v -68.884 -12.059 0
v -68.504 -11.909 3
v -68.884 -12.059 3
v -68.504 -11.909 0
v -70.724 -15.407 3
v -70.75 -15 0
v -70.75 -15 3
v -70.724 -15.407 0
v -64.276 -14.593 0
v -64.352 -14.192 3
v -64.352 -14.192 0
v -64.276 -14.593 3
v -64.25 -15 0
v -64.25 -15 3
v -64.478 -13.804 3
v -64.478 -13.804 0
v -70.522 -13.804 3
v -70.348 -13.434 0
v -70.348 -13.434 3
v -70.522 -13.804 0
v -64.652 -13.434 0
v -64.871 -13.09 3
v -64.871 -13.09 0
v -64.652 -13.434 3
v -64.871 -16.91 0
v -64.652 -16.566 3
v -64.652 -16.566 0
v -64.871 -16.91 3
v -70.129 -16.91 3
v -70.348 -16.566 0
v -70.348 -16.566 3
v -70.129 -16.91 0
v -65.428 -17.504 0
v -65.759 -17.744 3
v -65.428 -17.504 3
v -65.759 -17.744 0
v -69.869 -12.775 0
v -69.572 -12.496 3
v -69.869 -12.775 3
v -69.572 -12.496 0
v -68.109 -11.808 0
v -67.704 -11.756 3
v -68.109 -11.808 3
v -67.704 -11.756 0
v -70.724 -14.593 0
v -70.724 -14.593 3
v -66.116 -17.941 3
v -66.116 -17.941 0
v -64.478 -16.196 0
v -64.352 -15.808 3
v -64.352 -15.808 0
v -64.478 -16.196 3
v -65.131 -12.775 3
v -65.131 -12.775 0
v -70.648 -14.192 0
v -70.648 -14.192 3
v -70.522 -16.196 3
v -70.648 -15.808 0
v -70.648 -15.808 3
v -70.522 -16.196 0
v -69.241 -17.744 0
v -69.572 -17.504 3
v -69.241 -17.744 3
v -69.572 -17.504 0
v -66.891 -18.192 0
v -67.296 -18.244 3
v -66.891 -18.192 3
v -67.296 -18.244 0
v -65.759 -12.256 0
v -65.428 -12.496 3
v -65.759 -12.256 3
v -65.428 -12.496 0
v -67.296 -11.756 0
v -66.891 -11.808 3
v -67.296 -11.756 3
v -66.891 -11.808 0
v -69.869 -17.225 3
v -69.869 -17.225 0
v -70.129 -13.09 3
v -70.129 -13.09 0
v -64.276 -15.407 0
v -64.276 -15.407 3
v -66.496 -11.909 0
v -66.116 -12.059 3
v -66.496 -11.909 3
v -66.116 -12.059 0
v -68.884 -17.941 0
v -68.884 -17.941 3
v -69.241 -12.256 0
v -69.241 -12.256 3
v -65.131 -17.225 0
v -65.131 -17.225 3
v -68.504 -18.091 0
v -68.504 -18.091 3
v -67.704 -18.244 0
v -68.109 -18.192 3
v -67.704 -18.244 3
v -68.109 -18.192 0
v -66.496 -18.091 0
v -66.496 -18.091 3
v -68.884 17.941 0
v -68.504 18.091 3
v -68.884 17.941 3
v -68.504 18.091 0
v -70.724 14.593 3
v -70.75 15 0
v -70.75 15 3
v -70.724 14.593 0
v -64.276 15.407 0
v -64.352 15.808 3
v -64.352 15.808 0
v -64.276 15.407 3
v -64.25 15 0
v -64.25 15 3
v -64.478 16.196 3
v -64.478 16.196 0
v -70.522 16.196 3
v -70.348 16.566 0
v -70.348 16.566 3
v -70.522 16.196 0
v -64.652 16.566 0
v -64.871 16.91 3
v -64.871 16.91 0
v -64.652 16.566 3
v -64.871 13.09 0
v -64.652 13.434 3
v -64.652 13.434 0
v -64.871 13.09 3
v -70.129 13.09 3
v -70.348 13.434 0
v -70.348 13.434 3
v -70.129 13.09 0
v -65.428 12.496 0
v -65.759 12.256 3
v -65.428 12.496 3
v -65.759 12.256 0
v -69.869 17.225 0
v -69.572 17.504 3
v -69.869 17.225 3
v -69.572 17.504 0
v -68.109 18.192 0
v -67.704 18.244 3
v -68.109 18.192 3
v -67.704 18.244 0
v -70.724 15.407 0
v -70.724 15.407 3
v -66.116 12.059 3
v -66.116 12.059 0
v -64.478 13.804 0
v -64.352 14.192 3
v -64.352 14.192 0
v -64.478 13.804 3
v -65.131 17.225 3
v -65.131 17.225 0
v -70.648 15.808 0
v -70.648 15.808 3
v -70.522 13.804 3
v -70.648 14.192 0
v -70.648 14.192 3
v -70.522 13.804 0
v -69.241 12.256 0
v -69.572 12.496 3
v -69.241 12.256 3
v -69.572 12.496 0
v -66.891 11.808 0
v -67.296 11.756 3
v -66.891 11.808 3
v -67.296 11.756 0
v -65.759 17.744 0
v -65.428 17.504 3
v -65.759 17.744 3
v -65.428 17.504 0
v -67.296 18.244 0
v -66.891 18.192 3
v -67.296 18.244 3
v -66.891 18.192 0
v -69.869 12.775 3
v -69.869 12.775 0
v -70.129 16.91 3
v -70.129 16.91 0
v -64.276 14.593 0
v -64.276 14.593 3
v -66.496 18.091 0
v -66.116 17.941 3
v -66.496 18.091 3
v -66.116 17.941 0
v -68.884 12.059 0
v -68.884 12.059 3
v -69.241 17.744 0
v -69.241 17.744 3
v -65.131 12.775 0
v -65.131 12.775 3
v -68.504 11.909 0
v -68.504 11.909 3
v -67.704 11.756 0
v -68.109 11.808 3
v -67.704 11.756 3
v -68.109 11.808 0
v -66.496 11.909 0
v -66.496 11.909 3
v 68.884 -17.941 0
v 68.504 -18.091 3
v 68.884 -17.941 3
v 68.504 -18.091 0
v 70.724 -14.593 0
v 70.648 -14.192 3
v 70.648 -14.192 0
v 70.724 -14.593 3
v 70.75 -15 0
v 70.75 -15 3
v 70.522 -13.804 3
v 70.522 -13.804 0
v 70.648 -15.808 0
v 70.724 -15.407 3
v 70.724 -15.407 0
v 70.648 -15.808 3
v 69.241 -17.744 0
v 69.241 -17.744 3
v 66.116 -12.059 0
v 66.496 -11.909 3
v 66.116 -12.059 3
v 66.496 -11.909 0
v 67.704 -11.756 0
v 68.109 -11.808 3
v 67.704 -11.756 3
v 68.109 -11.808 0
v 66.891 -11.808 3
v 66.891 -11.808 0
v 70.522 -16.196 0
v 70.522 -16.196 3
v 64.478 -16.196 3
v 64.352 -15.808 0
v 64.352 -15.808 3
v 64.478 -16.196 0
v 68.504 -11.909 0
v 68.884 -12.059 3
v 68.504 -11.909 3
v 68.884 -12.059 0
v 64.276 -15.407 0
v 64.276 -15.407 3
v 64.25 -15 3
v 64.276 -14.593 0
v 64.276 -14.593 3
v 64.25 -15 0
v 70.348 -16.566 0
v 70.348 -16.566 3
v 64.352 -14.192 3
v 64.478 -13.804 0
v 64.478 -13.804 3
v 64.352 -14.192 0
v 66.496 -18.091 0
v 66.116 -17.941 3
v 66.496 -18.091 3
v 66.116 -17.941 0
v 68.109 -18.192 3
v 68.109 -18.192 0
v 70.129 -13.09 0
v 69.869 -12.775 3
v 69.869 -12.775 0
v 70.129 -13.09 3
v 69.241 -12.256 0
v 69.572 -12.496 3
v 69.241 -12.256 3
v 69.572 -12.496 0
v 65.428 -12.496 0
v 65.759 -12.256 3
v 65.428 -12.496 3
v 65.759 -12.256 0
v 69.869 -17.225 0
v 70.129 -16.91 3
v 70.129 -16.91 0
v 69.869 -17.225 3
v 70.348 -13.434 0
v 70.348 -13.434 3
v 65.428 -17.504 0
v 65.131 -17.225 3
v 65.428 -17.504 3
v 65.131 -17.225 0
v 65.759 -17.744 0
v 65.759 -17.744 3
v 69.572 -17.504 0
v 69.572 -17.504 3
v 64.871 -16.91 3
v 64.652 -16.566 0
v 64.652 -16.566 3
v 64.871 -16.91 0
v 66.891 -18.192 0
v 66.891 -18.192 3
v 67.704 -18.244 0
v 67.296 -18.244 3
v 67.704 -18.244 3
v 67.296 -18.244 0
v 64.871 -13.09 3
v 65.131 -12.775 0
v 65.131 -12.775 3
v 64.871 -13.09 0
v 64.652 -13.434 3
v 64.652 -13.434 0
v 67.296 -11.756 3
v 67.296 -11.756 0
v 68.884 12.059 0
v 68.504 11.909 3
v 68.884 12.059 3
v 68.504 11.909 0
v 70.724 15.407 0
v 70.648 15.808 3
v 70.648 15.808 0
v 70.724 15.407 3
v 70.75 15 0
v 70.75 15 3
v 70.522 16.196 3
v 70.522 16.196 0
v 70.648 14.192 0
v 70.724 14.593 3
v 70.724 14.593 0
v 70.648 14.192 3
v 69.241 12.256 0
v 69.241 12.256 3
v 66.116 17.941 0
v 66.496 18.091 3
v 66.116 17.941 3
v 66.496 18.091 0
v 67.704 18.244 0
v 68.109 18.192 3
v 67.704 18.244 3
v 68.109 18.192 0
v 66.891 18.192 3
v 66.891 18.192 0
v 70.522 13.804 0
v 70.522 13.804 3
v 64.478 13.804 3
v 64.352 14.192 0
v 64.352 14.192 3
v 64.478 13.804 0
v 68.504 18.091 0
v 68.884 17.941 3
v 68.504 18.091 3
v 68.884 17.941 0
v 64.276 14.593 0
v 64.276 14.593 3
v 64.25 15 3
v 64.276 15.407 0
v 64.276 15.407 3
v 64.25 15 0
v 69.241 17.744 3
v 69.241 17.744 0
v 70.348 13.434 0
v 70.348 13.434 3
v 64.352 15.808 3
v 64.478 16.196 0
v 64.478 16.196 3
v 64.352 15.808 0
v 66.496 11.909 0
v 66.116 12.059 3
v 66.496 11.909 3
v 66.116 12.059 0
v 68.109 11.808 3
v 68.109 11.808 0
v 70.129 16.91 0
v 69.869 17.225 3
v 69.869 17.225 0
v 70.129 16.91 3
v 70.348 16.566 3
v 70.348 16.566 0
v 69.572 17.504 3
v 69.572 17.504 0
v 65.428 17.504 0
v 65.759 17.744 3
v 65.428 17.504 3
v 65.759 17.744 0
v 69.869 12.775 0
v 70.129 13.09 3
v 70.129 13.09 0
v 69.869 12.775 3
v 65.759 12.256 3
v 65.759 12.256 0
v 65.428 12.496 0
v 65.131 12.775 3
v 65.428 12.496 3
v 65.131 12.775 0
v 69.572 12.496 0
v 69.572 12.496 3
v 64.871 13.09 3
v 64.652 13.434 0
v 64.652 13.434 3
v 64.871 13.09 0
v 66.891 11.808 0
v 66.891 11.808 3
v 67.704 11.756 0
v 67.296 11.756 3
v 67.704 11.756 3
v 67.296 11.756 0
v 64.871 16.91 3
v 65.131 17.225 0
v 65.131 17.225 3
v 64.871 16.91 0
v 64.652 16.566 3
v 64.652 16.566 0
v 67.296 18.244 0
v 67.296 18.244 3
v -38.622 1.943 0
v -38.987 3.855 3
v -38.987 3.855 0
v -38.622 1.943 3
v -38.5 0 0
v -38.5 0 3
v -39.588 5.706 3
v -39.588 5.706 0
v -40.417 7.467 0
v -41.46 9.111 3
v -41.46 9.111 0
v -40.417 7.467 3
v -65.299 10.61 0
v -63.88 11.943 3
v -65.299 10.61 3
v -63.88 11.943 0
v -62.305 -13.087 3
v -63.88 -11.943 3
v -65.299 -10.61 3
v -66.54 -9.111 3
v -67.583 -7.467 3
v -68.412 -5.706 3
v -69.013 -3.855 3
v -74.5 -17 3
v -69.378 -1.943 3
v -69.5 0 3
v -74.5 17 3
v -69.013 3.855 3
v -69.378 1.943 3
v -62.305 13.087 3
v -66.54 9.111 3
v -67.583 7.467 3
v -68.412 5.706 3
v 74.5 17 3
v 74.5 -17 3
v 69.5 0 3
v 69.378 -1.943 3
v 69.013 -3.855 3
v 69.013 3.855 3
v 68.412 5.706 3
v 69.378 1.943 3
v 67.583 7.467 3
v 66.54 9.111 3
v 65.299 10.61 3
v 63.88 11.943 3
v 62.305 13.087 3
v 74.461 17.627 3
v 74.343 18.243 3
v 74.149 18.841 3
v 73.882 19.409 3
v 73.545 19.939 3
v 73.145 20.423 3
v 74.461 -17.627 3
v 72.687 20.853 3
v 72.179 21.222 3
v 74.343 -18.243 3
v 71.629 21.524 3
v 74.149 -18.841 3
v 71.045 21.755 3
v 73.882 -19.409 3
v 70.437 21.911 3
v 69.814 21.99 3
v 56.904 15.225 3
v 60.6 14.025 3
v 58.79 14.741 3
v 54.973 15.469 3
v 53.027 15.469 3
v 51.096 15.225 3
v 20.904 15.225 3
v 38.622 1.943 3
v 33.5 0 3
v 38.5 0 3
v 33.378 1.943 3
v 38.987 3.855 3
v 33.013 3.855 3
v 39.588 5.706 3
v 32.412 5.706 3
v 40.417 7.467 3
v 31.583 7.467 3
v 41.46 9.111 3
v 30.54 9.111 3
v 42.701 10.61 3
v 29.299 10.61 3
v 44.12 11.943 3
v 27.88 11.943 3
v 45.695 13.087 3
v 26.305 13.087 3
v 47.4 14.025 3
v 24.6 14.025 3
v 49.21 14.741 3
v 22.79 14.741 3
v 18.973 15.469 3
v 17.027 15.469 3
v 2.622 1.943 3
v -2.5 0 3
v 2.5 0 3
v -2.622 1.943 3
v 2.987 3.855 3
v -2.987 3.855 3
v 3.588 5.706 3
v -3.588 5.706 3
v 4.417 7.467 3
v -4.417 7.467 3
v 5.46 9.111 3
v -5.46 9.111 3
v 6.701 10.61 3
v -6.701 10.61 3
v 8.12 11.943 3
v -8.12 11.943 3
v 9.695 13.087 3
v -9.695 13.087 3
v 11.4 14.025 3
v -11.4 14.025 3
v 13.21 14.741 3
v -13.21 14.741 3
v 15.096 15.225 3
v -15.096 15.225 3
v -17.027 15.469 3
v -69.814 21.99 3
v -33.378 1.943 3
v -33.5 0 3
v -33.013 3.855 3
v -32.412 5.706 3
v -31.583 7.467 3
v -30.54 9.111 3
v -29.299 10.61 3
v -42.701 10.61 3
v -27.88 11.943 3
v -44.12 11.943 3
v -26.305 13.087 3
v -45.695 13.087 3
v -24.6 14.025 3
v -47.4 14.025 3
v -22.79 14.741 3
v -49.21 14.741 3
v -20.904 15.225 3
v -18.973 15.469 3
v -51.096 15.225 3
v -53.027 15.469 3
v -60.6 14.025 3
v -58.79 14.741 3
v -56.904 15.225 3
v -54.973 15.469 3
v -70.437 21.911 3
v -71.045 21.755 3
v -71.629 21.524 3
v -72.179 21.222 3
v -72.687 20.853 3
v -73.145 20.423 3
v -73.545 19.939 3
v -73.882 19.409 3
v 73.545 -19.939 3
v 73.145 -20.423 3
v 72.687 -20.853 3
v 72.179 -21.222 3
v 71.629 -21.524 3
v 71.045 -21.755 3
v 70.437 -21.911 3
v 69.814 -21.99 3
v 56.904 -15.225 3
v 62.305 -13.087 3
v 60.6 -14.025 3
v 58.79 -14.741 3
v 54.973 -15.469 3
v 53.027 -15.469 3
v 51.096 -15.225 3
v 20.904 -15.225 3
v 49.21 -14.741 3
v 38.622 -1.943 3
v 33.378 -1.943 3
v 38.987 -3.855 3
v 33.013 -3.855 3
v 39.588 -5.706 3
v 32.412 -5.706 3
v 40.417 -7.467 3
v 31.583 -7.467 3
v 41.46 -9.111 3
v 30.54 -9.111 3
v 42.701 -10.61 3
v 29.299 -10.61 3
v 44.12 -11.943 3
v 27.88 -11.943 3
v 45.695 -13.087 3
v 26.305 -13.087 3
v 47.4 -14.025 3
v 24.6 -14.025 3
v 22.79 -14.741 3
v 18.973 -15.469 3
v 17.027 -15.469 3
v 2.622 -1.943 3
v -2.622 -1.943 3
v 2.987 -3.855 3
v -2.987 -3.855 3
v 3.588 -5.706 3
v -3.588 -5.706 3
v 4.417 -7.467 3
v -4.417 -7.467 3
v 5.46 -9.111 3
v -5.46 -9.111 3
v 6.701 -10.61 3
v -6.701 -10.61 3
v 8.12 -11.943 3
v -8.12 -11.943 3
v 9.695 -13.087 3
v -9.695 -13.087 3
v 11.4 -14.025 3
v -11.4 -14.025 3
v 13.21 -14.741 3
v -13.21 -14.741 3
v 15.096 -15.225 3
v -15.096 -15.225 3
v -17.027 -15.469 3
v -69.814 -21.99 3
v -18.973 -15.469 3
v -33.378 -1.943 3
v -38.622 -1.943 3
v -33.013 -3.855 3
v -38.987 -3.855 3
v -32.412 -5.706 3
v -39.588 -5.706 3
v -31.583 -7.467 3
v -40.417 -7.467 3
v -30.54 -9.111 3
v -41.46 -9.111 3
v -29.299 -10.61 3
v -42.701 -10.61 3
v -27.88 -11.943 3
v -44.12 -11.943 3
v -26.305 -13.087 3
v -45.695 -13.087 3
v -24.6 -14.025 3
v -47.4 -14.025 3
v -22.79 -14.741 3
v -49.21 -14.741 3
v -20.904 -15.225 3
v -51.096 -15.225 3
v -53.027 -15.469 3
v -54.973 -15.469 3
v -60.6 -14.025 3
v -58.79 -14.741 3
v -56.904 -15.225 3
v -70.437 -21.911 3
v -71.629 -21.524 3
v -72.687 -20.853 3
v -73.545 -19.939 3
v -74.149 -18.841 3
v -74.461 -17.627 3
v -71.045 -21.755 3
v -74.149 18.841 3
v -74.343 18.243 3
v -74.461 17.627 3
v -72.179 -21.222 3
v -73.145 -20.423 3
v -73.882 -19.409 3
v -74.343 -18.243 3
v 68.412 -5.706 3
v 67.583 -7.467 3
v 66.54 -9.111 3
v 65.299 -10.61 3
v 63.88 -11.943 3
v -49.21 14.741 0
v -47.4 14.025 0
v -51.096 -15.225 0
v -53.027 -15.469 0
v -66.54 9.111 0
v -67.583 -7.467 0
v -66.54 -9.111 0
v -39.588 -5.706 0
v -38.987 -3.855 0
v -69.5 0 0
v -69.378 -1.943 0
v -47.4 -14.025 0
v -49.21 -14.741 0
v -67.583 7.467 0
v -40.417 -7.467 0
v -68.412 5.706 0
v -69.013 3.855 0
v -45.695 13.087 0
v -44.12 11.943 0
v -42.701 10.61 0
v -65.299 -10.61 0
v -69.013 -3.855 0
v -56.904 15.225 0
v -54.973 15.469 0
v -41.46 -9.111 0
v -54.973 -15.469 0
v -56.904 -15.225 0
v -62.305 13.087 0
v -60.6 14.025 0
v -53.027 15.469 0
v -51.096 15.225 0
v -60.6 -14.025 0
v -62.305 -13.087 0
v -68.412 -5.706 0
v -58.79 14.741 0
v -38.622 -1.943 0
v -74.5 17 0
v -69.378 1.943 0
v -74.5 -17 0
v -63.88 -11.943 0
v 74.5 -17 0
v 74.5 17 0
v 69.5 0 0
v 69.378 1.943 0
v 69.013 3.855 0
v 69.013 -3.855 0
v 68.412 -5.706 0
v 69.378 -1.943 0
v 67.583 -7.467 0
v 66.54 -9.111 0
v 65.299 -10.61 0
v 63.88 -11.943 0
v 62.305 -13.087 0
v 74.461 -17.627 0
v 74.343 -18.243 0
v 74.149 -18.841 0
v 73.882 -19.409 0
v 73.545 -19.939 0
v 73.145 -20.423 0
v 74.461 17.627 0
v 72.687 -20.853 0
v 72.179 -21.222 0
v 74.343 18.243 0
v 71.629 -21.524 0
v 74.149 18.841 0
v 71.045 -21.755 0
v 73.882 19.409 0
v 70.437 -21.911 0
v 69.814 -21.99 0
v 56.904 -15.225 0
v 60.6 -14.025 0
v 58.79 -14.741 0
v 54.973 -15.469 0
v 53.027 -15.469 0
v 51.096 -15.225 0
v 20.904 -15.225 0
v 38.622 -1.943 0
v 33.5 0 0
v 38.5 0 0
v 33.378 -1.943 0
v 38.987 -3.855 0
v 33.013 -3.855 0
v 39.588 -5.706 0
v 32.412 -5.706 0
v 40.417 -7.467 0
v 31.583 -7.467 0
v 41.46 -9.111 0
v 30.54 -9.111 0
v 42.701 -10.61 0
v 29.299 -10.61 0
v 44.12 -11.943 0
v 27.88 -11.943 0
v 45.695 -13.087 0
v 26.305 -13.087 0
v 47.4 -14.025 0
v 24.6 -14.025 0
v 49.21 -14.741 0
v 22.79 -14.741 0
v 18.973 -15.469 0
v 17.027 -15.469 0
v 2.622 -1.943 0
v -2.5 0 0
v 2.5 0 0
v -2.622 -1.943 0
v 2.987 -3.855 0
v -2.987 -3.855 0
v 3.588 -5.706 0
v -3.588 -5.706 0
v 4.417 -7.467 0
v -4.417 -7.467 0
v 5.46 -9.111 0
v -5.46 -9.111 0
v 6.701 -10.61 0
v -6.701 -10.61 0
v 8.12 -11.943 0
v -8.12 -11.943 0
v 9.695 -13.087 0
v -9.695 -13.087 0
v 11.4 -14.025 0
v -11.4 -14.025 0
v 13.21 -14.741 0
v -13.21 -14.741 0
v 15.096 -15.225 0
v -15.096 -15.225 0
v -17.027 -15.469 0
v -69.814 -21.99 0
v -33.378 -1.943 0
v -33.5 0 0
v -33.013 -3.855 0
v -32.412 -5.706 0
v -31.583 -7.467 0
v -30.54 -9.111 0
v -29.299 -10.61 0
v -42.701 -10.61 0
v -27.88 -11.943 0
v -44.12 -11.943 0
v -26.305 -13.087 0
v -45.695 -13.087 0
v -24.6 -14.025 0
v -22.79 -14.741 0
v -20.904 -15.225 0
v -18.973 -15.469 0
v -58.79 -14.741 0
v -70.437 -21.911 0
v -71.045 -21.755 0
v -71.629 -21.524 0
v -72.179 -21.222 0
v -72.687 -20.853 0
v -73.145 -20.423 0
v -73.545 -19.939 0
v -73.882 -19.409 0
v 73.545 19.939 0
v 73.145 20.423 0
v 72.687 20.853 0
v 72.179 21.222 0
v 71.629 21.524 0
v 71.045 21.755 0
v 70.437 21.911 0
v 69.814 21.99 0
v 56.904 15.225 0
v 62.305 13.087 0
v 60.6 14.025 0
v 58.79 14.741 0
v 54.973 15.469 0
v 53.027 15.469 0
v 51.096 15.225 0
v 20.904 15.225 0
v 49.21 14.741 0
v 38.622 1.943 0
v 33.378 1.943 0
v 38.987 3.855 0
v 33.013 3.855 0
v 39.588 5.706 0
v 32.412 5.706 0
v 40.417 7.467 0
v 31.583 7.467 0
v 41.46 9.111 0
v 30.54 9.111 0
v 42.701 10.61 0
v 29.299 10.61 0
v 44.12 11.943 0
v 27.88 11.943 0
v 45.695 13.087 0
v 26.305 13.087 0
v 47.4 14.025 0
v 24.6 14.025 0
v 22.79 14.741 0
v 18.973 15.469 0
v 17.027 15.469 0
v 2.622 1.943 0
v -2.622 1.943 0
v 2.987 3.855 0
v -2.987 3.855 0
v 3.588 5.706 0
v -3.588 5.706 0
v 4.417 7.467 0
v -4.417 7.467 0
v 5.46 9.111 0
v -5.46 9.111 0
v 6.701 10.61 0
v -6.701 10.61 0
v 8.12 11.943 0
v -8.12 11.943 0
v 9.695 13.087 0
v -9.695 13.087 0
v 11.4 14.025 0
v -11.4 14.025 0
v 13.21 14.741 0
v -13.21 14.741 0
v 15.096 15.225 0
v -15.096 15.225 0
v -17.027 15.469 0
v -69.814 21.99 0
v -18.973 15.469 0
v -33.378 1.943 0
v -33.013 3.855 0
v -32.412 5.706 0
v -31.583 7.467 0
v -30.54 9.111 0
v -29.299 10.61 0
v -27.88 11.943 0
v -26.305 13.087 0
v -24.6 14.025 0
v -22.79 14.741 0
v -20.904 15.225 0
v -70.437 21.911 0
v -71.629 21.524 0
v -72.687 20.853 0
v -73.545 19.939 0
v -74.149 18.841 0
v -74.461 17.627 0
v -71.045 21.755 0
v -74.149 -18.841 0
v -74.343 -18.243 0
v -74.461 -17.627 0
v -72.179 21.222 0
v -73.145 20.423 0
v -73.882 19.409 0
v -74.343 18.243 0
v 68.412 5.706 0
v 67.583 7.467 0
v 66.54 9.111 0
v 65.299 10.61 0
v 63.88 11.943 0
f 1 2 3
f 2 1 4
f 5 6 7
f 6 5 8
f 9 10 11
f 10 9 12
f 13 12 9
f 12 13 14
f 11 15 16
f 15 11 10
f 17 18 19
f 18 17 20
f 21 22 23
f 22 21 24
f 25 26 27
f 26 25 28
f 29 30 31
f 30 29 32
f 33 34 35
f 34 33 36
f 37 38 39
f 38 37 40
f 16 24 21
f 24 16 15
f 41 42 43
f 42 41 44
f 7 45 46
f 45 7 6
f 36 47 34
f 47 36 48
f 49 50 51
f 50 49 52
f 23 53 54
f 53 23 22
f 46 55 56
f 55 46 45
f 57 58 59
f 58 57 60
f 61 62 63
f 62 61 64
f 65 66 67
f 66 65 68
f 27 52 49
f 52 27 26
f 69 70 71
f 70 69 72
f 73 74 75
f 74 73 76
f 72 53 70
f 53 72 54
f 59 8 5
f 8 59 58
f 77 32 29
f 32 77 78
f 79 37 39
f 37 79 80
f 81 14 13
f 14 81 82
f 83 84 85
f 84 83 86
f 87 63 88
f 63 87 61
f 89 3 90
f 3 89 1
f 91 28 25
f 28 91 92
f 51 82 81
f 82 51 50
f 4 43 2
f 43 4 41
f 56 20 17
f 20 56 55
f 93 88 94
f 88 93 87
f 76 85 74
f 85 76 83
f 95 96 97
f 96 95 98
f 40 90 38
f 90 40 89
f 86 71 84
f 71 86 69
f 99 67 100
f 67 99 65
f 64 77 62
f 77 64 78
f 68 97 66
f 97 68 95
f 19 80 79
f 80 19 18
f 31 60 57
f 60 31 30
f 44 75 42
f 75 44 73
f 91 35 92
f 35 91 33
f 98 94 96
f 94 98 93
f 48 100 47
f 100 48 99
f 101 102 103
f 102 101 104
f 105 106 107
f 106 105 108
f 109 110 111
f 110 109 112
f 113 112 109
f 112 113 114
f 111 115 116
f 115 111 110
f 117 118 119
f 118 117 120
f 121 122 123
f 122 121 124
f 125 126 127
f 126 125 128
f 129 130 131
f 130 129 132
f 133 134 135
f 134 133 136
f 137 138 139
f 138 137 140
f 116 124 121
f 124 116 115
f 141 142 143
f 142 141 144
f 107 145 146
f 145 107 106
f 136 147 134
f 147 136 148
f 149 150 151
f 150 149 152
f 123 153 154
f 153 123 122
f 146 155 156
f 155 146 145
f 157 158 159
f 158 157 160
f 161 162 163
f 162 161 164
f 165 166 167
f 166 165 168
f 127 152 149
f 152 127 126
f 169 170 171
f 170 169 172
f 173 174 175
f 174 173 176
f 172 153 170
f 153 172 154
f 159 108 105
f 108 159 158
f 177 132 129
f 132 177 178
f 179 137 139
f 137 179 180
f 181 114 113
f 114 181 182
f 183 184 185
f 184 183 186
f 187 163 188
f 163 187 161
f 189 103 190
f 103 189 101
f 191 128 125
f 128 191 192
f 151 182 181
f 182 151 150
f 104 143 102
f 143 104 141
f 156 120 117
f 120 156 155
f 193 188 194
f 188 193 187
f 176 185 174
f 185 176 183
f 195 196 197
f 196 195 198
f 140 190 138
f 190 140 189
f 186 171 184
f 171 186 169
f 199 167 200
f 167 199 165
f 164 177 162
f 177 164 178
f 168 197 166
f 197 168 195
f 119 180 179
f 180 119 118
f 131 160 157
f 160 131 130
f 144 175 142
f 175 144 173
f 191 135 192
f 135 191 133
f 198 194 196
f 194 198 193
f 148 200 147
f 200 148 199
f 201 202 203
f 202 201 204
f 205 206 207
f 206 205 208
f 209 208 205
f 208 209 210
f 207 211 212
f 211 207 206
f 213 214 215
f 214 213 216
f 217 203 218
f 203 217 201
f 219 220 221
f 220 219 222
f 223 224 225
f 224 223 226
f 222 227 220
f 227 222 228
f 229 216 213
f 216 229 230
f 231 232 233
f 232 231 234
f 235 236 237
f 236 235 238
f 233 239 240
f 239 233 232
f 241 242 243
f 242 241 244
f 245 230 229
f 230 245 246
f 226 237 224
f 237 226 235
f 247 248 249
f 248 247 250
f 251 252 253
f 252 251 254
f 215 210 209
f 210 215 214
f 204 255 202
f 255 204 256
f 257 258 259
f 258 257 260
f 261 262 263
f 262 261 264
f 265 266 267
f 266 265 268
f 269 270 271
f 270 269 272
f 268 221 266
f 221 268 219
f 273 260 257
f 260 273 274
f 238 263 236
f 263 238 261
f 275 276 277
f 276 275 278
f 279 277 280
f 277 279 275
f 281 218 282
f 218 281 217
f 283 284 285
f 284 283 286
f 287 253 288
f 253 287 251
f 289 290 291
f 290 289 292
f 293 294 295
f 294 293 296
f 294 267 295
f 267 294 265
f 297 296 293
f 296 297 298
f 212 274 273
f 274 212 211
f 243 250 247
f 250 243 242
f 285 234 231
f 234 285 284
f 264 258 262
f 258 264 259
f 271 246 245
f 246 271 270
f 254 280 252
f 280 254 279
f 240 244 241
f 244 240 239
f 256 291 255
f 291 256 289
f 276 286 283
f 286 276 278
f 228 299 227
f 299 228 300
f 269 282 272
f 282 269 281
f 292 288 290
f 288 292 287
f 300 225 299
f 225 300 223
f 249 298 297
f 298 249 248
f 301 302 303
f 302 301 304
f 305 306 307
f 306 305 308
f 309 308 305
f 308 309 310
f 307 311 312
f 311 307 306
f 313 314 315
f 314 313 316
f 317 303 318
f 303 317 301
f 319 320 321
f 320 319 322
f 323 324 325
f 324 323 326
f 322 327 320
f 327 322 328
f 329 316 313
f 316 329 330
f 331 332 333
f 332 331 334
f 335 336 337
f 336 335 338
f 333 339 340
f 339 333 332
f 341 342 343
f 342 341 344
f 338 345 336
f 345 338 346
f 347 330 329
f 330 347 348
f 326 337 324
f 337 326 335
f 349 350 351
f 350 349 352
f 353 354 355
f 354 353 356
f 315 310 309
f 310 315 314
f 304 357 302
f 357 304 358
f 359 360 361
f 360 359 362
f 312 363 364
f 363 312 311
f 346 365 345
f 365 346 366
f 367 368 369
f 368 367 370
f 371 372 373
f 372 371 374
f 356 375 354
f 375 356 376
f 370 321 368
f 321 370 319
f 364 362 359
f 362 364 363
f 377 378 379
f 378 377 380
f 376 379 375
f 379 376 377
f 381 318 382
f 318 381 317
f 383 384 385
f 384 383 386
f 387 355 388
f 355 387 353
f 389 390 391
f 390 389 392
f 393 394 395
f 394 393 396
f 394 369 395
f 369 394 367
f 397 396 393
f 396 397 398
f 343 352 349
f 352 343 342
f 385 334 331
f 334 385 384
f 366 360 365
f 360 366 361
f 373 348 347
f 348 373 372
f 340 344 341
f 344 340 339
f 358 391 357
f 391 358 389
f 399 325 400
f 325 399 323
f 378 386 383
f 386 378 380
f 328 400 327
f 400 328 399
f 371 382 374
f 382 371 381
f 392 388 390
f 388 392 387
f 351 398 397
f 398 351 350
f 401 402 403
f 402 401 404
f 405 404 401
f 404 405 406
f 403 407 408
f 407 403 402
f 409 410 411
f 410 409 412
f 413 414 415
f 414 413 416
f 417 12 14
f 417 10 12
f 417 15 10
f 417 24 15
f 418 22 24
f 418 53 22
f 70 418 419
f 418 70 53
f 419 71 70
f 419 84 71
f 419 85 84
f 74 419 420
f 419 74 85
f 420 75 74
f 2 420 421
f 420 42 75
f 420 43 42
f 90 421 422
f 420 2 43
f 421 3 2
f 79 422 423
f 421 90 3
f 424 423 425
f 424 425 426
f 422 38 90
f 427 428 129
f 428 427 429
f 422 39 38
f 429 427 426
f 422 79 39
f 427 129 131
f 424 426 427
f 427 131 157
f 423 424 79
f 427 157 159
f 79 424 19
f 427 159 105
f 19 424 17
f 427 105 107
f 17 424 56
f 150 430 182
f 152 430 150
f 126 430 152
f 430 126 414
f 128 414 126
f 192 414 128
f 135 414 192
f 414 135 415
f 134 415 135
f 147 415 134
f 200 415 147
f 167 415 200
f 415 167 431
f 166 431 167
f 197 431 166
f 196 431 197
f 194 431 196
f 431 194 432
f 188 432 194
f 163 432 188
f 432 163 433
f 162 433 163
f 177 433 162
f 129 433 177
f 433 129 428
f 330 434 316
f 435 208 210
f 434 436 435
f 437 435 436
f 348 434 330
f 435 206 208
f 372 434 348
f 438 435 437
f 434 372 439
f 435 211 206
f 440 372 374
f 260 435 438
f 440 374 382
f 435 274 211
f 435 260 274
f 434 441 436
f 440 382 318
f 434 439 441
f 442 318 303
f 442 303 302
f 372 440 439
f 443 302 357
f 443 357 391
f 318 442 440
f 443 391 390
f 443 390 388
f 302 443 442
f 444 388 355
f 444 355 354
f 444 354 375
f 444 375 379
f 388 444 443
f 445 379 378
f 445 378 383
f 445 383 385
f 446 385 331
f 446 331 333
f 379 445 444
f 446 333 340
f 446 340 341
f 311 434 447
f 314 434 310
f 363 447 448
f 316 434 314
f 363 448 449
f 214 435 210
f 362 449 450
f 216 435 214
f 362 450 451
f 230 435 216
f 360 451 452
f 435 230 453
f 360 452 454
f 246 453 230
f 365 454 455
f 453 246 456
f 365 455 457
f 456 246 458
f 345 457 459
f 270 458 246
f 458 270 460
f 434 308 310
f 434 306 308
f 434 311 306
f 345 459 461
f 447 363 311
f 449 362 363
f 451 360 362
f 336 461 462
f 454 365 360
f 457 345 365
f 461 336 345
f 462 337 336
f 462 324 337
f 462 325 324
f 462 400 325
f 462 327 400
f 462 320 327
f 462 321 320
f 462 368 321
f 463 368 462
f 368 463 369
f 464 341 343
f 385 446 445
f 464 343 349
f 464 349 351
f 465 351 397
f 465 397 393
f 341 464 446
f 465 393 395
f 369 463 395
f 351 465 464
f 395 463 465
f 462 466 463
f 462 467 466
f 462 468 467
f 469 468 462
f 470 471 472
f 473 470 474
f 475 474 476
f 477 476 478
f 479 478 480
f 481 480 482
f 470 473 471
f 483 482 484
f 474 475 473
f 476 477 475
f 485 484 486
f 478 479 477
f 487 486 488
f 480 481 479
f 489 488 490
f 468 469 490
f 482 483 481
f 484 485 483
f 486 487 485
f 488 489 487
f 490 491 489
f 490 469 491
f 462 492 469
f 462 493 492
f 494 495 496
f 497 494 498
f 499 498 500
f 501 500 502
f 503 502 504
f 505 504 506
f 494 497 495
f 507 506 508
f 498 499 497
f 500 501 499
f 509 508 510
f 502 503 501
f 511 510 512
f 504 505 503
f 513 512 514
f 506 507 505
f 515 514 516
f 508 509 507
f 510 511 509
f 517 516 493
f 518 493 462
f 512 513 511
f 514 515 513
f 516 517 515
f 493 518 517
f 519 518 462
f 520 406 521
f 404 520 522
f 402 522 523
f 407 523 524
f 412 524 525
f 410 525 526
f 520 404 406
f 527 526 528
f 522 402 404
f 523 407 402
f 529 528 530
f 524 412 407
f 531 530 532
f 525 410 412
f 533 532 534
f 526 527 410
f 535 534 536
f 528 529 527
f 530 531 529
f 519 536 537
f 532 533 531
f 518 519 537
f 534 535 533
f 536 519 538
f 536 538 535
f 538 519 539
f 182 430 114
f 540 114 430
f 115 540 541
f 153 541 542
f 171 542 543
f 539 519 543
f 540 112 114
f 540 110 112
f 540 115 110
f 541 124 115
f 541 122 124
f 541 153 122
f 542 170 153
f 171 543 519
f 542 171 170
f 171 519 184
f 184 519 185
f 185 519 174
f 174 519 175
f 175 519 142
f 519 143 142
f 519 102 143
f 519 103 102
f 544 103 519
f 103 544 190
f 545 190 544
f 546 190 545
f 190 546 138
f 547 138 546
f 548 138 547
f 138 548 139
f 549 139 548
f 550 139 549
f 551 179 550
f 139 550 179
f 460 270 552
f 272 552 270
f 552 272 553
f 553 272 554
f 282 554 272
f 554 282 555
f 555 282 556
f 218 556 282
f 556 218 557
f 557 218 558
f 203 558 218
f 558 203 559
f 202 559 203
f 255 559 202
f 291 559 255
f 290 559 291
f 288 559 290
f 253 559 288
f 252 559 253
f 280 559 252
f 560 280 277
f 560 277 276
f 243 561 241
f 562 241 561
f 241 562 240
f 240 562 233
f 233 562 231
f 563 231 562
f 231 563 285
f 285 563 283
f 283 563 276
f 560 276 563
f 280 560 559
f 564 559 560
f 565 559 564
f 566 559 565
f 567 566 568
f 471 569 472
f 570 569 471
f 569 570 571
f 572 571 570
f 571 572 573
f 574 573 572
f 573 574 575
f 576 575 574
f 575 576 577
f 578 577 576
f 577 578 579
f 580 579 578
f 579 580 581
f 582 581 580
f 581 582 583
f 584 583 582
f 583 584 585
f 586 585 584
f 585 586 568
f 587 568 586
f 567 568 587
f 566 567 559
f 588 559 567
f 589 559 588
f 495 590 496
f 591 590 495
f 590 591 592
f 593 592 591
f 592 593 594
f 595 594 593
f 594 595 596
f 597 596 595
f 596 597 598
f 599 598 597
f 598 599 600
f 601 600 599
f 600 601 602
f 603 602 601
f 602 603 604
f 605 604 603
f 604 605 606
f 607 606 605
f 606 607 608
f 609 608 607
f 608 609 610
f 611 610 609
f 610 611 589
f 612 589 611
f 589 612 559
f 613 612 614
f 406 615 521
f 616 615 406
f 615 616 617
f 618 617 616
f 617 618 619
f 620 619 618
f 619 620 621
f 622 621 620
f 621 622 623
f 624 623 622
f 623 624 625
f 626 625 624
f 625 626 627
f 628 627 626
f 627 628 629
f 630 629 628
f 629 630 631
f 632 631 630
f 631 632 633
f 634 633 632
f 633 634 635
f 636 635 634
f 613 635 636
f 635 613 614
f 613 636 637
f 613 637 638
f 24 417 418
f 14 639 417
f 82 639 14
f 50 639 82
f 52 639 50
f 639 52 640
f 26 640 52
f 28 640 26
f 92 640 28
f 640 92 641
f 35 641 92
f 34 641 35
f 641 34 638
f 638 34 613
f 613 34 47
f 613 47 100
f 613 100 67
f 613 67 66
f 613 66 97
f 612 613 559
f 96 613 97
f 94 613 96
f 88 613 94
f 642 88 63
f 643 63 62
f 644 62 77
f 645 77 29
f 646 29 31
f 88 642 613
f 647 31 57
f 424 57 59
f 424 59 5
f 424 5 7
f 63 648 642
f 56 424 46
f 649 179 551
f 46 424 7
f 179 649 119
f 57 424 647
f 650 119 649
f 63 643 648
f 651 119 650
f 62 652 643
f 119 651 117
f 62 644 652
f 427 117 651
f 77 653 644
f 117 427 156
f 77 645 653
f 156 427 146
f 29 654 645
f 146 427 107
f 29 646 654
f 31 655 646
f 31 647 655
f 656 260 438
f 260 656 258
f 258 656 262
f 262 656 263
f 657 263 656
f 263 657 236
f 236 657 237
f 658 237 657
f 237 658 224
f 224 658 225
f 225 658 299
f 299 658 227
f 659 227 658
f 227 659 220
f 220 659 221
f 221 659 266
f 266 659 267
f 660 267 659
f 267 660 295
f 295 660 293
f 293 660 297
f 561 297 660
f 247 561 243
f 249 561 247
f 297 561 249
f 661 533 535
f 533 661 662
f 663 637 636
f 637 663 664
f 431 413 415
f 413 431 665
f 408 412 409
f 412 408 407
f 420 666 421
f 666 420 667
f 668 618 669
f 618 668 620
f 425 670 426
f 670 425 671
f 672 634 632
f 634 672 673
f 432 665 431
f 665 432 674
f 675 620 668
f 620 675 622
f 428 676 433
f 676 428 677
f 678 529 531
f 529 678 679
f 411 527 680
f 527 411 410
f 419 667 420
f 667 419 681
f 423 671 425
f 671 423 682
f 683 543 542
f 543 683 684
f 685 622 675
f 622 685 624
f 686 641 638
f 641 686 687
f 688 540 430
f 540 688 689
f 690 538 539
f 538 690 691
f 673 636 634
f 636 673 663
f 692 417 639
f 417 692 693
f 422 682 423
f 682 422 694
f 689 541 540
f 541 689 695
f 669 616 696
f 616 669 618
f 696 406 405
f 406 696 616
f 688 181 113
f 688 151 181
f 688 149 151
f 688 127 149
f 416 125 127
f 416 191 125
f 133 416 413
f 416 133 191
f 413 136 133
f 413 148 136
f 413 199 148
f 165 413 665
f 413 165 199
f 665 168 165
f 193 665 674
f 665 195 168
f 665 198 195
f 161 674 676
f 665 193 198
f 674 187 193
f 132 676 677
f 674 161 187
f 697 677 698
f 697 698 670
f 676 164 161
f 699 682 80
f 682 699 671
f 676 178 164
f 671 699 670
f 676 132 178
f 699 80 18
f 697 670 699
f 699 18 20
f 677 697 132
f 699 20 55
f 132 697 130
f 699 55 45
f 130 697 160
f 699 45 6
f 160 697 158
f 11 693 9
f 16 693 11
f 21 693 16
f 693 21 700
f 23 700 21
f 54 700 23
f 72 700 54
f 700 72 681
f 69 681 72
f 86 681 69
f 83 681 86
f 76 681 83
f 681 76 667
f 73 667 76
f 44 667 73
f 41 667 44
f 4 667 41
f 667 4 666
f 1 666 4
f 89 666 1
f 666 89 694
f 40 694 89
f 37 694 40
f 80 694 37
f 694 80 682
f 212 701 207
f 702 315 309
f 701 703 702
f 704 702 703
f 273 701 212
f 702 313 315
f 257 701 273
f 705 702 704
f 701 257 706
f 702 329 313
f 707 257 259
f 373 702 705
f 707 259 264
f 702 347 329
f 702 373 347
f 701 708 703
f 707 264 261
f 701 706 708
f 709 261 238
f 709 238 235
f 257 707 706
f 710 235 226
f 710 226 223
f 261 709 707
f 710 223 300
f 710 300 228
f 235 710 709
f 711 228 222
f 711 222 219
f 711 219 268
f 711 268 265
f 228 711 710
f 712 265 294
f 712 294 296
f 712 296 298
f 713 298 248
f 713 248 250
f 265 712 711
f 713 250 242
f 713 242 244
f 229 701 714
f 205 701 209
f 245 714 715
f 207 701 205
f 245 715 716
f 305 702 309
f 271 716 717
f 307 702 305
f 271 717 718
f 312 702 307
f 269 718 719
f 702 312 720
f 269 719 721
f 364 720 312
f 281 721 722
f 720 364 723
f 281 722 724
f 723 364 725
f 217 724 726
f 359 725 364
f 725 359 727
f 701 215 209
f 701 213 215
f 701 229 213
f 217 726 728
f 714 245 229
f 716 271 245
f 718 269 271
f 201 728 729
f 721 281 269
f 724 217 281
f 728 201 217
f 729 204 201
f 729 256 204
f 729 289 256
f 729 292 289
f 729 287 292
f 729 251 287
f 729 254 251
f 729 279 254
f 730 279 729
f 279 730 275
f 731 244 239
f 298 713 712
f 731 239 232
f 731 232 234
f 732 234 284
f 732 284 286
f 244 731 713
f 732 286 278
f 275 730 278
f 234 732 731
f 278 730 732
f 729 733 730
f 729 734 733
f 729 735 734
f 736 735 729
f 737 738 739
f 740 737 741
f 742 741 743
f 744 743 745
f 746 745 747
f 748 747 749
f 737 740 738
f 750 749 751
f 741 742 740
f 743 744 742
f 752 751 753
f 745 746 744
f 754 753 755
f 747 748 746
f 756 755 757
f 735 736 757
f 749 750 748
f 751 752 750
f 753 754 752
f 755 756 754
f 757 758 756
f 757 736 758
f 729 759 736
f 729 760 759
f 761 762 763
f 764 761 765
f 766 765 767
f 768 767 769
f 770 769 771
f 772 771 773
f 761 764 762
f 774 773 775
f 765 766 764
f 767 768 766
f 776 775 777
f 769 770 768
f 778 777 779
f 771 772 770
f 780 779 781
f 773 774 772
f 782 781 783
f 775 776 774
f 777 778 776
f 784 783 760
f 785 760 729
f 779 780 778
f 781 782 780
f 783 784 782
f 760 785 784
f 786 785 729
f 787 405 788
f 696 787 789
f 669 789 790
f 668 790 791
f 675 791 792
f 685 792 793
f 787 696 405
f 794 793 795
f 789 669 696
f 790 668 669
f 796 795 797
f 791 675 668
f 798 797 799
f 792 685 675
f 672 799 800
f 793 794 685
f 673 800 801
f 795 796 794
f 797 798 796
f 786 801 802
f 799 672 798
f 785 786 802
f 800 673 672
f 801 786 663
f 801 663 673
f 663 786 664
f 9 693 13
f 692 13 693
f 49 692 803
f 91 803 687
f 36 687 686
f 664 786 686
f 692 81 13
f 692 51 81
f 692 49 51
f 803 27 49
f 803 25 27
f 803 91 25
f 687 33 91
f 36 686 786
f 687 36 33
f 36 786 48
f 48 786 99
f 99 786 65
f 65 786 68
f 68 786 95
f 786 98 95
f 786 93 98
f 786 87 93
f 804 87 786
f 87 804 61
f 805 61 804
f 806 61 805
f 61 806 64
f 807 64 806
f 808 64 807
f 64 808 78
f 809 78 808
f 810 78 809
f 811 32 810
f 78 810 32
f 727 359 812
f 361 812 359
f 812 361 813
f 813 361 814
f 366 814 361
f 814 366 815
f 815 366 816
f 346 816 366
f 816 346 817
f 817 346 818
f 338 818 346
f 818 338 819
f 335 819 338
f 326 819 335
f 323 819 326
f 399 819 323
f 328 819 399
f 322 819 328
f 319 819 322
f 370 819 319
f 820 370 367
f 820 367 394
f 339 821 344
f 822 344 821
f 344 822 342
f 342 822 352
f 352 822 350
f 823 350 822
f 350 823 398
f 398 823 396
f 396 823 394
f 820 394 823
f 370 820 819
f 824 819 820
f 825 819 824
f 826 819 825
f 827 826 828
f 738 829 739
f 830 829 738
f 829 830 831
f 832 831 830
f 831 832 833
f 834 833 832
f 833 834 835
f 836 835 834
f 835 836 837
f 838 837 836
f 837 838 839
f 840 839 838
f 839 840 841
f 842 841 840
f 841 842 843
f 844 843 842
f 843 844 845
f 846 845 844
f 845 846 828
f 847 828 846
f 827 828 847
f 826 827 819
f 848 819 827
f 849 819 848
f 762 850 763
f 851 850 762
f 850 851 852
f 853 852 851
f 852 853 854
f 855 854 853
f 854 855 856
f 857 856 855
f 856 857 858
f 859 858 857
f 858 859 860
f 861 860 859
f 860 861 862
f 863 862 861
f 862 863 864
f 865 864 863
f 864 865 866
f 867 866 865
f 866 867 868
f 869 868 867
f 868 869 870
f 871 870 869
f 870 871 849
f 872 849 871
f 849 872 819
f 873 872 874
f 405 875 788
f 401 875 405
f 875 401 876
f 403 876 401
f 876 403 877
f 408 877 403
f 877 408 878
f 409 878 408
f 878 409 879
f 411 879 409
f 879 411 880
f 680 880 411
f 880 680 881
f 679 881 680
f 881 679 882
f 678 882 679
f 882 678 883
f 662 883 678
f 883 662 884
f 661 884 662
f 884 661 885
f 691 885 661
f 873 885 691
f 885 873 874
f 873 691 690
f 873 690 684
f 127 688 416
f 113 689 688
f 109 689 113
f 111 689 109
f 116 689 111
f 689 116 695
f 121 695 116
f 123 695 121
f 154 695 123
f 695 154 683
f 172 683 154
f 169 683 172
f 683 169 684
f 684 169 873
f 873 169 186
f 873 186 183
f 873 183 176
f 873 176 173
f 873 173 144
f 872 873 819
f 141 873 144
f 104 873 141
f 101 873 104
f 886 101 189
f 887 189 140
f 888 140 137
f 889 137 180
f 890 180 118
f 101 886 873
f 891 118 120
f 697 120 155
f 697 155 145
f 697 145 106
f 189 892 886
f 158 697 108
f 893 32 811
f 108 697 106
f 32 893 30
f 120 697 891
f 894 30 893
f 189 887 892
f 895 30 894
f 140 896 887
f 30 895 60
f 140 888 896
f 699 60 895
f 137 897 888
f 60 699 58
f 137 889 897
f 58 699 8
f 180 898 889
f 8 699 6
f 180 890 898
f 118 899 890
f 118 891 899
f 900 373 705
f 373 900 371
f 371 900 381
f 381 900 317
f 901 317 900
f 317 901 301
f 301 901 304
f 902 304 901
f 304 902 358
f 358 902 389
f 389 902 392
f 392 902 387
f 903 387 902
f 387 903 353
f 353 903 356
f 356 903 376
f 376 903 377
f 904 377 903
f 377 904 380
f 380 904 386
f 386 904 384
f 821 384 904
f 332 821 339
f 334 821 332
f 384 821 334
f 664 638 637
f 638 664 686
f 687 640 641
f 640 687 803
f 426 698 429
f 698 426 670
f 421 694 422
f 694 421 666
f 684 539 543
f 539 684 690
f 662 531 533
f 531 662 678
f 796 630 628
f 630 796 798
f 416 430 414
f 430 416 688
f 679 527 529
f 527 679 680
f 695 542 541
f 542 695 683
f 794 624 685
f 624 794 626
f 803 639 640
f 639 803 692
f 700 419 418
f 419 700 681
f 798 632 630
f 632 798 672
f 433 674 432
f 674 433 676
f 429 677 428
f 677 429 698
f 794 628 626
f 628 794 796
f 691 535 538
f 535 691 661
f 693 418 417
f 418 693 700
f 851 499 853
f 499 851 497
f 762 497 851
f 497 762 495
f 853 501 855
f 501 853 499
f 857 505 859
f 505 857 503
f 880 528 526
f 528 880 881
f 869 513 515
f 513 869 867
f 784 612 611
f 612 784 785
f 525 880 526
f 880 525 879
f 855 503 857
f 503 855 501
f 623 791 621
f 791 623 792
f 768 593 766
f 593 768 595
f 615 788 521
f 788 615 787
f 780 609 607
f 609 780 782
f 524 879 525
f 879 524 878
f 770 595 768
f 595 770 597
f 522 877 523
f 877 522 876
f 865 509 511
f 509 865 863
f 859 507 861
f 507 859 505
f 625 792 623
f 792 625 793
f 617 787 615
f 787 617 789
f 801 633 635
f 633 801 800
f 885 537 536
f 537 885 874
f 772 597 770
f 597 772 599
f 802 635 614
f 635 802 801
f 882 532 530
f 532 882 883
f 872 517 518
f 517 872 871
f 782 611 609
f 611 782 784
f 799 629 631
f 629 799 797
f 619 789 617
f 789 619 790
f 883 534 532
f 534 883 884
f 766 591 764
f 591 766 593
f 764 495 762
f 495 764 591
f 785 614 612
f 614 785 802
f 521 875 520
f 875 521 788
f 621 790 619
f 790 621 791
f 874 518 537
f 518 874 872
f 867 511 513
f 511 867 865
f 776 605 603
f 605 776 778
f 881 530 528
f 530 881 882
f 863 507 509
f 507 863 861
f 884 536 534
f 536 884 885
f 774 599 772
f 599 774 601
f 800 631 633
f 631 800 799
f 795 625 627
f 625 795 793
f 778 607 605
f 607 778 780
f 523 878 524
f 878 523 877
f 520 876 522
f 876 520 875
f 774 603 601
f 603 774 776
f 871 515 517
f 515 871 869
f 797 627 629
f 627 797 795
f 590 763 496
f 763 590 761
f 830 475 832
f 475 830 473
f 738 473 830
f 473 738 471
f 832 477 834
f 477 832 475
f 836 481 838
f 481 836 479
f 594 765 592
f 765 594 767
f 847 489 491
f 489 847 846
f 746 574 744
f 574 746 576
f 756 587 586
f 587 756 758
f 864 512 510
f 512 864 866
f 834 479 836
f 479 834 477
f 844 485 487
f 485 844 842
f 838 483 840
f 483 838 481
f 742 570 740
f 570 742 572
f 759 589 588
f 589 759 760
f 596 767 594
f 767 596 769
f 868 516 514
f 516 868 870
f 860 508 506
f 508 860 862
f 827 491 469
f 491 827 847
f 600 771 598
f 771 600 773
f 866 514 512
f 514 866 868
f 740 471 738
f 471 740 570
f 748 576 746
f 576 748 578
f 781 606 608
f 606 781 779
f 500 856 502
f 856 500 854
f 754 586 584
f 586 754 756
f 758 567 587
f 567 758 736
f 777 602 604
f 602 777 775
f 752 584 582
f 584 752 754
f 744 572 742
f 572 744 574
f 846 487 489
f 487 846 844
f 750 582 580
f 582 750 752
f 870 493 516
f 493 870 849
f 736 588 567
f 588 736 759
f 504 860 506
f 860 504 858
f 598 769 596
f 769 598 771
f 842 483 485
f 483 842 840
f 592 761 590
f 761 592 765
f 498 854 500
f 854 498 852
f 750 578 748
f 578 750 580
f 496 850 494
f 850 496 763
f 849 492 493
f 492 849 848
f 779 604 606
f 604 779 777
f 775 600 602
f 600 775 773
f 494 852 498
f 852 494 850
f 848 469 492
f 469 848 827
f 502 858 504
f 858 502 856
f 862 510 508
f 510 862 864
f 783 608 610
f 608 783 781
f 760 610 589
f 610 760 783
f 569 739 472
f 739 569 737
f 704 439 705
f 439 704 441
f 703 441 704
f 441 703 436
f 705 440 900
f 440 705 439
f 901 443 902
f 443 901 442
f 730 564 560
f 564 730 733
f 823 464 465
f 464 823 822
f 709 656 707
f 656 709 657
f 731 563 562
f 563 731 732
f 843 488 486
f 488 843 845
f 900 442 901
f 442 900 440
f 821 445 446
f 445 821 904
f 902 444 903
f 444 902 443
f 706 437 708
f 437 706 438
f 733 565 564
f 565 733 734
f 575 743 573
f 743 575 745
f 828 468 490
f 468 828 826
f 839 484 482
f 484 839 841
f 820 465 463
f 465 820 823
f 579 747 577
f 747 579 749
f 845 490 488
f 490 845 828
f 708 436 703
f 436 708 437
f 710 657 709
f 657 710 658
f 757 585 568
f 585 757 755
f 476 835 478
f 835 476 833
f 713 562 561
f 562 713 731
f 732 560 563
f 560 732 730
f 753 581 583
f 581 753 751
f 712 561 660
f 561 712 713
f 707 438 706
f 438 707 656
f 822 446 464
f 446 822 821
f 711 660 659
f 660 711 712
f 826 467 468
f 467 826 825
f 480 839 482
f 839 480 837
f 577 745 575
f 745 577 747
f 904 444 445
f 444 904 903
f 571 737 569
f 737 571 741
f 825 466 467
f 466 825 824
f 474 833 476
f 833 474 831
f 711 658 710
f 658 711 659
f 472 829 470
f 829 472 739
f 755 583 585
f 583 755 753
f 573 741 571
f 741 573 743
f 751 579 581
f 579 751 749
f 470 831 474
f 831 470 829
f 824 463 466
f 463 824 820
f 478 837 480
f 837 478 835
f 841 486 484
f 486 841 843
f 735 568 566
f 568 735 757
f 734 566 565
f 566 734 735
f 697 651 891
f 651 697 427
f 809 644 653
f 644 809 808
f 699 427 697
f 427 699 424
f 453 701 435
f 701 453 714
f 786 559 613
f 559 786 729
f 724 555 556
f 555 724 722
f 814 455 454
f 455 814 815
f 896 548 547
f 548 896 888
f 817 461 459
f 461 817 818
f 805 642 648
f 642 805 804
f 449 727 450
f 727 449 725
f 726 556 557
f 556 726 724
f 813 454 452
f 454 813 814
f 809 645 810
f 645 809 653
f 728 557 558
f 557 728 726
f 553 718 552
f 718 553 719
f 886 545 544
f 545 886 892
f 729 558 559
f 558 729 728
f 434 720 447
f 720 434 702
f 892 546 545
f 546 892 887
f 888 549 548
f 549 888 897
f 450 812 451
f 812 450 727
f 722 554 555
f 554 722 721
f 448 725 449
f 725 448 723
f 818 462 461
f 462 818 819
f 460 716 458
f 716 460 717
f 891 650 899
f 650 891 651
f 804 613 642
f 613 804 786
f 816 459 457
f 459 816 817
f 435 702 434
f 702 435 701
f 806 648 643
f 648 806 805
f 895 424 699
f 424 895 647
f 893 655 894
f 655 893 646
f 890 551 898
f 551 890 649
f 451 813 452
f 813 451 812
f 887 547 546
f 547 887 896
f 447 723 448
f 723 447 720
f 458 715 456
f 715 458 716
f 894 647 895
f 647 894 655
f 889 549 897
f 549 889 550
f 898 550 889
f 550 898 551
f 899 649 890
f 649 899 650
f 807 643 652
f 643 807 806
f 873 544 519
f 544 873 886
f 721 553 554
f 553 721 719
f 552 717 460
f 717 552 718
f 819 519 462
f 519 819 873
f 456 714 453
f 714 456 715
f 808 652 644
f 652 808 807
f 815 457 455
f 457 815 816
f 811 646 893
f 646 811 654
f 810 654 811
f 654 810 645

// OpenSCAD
$fn = 50;

difference() {
	union() {
		hull() {
			translate(v = [-69.5, 17.0, 0]) {
				cylinder(h = 3, r = 5);
			}
			translate(v = [69.5, 17.0, 0]) {
				cylinder(h = 3, r = 5);
			}
			translate(v = [-69.5, -17.0, 0]) {
				cylinder(h = 3, r = 5);
			}
			translate(v = [69.5, -17.0, 0]) {
				cylinder(h = 3, r = 5);
			}
		}
	}
	union() {
		translate(v = [-67.5, -15.0, -100.0]) {
			cylinder(h = 200, r = 3.25);
		}
		translate(v = [-67.5, 15.0, -100.0]) {
			cylinder(h = 200, r = 3.25);
		}
		translate(v = [67.5, -15.0, -100.0]) {
			cylinder(h = 200, r = 3.25);
		}
		translate(v = [67.5, 15.0, -100.0]) {
			cylinder(h = 200, r = 3.25);
		}
		translate(v = [-67.5, -15.0, -100.0]) {
			cylinder(h = 200, r = 1.8);
		}
		translate(v = [-67.5, 15.0, -100.0]) {
			cylinder(h = 200, r = 1.8);
		}
		translate(v = [67.5, -15.0, -100.0]) {
			cylinder(h = 200, r = 1.8);
		}
		translate(v = [67.5, 15.0, -100.0]) {
			cylinder(h = 200, r = 1.8);
		}
		translate(v = [-54.0, 0, 0.0]) {
			cylinder(h = 3, r = 15.5);
		}
		translate(v = [-18.0, 0, 0.0]) {
			cylinder(h = 3, r = 15.5);
		}
		translate(v = [18.0, 0, 0.0]) {
			cylinder(h = 3, r = 15.5);
		}
		translate(v = [54.0, 0, 0.0]) {
			cylinder(h = 3, r = 15.5);
		}
	}
}
